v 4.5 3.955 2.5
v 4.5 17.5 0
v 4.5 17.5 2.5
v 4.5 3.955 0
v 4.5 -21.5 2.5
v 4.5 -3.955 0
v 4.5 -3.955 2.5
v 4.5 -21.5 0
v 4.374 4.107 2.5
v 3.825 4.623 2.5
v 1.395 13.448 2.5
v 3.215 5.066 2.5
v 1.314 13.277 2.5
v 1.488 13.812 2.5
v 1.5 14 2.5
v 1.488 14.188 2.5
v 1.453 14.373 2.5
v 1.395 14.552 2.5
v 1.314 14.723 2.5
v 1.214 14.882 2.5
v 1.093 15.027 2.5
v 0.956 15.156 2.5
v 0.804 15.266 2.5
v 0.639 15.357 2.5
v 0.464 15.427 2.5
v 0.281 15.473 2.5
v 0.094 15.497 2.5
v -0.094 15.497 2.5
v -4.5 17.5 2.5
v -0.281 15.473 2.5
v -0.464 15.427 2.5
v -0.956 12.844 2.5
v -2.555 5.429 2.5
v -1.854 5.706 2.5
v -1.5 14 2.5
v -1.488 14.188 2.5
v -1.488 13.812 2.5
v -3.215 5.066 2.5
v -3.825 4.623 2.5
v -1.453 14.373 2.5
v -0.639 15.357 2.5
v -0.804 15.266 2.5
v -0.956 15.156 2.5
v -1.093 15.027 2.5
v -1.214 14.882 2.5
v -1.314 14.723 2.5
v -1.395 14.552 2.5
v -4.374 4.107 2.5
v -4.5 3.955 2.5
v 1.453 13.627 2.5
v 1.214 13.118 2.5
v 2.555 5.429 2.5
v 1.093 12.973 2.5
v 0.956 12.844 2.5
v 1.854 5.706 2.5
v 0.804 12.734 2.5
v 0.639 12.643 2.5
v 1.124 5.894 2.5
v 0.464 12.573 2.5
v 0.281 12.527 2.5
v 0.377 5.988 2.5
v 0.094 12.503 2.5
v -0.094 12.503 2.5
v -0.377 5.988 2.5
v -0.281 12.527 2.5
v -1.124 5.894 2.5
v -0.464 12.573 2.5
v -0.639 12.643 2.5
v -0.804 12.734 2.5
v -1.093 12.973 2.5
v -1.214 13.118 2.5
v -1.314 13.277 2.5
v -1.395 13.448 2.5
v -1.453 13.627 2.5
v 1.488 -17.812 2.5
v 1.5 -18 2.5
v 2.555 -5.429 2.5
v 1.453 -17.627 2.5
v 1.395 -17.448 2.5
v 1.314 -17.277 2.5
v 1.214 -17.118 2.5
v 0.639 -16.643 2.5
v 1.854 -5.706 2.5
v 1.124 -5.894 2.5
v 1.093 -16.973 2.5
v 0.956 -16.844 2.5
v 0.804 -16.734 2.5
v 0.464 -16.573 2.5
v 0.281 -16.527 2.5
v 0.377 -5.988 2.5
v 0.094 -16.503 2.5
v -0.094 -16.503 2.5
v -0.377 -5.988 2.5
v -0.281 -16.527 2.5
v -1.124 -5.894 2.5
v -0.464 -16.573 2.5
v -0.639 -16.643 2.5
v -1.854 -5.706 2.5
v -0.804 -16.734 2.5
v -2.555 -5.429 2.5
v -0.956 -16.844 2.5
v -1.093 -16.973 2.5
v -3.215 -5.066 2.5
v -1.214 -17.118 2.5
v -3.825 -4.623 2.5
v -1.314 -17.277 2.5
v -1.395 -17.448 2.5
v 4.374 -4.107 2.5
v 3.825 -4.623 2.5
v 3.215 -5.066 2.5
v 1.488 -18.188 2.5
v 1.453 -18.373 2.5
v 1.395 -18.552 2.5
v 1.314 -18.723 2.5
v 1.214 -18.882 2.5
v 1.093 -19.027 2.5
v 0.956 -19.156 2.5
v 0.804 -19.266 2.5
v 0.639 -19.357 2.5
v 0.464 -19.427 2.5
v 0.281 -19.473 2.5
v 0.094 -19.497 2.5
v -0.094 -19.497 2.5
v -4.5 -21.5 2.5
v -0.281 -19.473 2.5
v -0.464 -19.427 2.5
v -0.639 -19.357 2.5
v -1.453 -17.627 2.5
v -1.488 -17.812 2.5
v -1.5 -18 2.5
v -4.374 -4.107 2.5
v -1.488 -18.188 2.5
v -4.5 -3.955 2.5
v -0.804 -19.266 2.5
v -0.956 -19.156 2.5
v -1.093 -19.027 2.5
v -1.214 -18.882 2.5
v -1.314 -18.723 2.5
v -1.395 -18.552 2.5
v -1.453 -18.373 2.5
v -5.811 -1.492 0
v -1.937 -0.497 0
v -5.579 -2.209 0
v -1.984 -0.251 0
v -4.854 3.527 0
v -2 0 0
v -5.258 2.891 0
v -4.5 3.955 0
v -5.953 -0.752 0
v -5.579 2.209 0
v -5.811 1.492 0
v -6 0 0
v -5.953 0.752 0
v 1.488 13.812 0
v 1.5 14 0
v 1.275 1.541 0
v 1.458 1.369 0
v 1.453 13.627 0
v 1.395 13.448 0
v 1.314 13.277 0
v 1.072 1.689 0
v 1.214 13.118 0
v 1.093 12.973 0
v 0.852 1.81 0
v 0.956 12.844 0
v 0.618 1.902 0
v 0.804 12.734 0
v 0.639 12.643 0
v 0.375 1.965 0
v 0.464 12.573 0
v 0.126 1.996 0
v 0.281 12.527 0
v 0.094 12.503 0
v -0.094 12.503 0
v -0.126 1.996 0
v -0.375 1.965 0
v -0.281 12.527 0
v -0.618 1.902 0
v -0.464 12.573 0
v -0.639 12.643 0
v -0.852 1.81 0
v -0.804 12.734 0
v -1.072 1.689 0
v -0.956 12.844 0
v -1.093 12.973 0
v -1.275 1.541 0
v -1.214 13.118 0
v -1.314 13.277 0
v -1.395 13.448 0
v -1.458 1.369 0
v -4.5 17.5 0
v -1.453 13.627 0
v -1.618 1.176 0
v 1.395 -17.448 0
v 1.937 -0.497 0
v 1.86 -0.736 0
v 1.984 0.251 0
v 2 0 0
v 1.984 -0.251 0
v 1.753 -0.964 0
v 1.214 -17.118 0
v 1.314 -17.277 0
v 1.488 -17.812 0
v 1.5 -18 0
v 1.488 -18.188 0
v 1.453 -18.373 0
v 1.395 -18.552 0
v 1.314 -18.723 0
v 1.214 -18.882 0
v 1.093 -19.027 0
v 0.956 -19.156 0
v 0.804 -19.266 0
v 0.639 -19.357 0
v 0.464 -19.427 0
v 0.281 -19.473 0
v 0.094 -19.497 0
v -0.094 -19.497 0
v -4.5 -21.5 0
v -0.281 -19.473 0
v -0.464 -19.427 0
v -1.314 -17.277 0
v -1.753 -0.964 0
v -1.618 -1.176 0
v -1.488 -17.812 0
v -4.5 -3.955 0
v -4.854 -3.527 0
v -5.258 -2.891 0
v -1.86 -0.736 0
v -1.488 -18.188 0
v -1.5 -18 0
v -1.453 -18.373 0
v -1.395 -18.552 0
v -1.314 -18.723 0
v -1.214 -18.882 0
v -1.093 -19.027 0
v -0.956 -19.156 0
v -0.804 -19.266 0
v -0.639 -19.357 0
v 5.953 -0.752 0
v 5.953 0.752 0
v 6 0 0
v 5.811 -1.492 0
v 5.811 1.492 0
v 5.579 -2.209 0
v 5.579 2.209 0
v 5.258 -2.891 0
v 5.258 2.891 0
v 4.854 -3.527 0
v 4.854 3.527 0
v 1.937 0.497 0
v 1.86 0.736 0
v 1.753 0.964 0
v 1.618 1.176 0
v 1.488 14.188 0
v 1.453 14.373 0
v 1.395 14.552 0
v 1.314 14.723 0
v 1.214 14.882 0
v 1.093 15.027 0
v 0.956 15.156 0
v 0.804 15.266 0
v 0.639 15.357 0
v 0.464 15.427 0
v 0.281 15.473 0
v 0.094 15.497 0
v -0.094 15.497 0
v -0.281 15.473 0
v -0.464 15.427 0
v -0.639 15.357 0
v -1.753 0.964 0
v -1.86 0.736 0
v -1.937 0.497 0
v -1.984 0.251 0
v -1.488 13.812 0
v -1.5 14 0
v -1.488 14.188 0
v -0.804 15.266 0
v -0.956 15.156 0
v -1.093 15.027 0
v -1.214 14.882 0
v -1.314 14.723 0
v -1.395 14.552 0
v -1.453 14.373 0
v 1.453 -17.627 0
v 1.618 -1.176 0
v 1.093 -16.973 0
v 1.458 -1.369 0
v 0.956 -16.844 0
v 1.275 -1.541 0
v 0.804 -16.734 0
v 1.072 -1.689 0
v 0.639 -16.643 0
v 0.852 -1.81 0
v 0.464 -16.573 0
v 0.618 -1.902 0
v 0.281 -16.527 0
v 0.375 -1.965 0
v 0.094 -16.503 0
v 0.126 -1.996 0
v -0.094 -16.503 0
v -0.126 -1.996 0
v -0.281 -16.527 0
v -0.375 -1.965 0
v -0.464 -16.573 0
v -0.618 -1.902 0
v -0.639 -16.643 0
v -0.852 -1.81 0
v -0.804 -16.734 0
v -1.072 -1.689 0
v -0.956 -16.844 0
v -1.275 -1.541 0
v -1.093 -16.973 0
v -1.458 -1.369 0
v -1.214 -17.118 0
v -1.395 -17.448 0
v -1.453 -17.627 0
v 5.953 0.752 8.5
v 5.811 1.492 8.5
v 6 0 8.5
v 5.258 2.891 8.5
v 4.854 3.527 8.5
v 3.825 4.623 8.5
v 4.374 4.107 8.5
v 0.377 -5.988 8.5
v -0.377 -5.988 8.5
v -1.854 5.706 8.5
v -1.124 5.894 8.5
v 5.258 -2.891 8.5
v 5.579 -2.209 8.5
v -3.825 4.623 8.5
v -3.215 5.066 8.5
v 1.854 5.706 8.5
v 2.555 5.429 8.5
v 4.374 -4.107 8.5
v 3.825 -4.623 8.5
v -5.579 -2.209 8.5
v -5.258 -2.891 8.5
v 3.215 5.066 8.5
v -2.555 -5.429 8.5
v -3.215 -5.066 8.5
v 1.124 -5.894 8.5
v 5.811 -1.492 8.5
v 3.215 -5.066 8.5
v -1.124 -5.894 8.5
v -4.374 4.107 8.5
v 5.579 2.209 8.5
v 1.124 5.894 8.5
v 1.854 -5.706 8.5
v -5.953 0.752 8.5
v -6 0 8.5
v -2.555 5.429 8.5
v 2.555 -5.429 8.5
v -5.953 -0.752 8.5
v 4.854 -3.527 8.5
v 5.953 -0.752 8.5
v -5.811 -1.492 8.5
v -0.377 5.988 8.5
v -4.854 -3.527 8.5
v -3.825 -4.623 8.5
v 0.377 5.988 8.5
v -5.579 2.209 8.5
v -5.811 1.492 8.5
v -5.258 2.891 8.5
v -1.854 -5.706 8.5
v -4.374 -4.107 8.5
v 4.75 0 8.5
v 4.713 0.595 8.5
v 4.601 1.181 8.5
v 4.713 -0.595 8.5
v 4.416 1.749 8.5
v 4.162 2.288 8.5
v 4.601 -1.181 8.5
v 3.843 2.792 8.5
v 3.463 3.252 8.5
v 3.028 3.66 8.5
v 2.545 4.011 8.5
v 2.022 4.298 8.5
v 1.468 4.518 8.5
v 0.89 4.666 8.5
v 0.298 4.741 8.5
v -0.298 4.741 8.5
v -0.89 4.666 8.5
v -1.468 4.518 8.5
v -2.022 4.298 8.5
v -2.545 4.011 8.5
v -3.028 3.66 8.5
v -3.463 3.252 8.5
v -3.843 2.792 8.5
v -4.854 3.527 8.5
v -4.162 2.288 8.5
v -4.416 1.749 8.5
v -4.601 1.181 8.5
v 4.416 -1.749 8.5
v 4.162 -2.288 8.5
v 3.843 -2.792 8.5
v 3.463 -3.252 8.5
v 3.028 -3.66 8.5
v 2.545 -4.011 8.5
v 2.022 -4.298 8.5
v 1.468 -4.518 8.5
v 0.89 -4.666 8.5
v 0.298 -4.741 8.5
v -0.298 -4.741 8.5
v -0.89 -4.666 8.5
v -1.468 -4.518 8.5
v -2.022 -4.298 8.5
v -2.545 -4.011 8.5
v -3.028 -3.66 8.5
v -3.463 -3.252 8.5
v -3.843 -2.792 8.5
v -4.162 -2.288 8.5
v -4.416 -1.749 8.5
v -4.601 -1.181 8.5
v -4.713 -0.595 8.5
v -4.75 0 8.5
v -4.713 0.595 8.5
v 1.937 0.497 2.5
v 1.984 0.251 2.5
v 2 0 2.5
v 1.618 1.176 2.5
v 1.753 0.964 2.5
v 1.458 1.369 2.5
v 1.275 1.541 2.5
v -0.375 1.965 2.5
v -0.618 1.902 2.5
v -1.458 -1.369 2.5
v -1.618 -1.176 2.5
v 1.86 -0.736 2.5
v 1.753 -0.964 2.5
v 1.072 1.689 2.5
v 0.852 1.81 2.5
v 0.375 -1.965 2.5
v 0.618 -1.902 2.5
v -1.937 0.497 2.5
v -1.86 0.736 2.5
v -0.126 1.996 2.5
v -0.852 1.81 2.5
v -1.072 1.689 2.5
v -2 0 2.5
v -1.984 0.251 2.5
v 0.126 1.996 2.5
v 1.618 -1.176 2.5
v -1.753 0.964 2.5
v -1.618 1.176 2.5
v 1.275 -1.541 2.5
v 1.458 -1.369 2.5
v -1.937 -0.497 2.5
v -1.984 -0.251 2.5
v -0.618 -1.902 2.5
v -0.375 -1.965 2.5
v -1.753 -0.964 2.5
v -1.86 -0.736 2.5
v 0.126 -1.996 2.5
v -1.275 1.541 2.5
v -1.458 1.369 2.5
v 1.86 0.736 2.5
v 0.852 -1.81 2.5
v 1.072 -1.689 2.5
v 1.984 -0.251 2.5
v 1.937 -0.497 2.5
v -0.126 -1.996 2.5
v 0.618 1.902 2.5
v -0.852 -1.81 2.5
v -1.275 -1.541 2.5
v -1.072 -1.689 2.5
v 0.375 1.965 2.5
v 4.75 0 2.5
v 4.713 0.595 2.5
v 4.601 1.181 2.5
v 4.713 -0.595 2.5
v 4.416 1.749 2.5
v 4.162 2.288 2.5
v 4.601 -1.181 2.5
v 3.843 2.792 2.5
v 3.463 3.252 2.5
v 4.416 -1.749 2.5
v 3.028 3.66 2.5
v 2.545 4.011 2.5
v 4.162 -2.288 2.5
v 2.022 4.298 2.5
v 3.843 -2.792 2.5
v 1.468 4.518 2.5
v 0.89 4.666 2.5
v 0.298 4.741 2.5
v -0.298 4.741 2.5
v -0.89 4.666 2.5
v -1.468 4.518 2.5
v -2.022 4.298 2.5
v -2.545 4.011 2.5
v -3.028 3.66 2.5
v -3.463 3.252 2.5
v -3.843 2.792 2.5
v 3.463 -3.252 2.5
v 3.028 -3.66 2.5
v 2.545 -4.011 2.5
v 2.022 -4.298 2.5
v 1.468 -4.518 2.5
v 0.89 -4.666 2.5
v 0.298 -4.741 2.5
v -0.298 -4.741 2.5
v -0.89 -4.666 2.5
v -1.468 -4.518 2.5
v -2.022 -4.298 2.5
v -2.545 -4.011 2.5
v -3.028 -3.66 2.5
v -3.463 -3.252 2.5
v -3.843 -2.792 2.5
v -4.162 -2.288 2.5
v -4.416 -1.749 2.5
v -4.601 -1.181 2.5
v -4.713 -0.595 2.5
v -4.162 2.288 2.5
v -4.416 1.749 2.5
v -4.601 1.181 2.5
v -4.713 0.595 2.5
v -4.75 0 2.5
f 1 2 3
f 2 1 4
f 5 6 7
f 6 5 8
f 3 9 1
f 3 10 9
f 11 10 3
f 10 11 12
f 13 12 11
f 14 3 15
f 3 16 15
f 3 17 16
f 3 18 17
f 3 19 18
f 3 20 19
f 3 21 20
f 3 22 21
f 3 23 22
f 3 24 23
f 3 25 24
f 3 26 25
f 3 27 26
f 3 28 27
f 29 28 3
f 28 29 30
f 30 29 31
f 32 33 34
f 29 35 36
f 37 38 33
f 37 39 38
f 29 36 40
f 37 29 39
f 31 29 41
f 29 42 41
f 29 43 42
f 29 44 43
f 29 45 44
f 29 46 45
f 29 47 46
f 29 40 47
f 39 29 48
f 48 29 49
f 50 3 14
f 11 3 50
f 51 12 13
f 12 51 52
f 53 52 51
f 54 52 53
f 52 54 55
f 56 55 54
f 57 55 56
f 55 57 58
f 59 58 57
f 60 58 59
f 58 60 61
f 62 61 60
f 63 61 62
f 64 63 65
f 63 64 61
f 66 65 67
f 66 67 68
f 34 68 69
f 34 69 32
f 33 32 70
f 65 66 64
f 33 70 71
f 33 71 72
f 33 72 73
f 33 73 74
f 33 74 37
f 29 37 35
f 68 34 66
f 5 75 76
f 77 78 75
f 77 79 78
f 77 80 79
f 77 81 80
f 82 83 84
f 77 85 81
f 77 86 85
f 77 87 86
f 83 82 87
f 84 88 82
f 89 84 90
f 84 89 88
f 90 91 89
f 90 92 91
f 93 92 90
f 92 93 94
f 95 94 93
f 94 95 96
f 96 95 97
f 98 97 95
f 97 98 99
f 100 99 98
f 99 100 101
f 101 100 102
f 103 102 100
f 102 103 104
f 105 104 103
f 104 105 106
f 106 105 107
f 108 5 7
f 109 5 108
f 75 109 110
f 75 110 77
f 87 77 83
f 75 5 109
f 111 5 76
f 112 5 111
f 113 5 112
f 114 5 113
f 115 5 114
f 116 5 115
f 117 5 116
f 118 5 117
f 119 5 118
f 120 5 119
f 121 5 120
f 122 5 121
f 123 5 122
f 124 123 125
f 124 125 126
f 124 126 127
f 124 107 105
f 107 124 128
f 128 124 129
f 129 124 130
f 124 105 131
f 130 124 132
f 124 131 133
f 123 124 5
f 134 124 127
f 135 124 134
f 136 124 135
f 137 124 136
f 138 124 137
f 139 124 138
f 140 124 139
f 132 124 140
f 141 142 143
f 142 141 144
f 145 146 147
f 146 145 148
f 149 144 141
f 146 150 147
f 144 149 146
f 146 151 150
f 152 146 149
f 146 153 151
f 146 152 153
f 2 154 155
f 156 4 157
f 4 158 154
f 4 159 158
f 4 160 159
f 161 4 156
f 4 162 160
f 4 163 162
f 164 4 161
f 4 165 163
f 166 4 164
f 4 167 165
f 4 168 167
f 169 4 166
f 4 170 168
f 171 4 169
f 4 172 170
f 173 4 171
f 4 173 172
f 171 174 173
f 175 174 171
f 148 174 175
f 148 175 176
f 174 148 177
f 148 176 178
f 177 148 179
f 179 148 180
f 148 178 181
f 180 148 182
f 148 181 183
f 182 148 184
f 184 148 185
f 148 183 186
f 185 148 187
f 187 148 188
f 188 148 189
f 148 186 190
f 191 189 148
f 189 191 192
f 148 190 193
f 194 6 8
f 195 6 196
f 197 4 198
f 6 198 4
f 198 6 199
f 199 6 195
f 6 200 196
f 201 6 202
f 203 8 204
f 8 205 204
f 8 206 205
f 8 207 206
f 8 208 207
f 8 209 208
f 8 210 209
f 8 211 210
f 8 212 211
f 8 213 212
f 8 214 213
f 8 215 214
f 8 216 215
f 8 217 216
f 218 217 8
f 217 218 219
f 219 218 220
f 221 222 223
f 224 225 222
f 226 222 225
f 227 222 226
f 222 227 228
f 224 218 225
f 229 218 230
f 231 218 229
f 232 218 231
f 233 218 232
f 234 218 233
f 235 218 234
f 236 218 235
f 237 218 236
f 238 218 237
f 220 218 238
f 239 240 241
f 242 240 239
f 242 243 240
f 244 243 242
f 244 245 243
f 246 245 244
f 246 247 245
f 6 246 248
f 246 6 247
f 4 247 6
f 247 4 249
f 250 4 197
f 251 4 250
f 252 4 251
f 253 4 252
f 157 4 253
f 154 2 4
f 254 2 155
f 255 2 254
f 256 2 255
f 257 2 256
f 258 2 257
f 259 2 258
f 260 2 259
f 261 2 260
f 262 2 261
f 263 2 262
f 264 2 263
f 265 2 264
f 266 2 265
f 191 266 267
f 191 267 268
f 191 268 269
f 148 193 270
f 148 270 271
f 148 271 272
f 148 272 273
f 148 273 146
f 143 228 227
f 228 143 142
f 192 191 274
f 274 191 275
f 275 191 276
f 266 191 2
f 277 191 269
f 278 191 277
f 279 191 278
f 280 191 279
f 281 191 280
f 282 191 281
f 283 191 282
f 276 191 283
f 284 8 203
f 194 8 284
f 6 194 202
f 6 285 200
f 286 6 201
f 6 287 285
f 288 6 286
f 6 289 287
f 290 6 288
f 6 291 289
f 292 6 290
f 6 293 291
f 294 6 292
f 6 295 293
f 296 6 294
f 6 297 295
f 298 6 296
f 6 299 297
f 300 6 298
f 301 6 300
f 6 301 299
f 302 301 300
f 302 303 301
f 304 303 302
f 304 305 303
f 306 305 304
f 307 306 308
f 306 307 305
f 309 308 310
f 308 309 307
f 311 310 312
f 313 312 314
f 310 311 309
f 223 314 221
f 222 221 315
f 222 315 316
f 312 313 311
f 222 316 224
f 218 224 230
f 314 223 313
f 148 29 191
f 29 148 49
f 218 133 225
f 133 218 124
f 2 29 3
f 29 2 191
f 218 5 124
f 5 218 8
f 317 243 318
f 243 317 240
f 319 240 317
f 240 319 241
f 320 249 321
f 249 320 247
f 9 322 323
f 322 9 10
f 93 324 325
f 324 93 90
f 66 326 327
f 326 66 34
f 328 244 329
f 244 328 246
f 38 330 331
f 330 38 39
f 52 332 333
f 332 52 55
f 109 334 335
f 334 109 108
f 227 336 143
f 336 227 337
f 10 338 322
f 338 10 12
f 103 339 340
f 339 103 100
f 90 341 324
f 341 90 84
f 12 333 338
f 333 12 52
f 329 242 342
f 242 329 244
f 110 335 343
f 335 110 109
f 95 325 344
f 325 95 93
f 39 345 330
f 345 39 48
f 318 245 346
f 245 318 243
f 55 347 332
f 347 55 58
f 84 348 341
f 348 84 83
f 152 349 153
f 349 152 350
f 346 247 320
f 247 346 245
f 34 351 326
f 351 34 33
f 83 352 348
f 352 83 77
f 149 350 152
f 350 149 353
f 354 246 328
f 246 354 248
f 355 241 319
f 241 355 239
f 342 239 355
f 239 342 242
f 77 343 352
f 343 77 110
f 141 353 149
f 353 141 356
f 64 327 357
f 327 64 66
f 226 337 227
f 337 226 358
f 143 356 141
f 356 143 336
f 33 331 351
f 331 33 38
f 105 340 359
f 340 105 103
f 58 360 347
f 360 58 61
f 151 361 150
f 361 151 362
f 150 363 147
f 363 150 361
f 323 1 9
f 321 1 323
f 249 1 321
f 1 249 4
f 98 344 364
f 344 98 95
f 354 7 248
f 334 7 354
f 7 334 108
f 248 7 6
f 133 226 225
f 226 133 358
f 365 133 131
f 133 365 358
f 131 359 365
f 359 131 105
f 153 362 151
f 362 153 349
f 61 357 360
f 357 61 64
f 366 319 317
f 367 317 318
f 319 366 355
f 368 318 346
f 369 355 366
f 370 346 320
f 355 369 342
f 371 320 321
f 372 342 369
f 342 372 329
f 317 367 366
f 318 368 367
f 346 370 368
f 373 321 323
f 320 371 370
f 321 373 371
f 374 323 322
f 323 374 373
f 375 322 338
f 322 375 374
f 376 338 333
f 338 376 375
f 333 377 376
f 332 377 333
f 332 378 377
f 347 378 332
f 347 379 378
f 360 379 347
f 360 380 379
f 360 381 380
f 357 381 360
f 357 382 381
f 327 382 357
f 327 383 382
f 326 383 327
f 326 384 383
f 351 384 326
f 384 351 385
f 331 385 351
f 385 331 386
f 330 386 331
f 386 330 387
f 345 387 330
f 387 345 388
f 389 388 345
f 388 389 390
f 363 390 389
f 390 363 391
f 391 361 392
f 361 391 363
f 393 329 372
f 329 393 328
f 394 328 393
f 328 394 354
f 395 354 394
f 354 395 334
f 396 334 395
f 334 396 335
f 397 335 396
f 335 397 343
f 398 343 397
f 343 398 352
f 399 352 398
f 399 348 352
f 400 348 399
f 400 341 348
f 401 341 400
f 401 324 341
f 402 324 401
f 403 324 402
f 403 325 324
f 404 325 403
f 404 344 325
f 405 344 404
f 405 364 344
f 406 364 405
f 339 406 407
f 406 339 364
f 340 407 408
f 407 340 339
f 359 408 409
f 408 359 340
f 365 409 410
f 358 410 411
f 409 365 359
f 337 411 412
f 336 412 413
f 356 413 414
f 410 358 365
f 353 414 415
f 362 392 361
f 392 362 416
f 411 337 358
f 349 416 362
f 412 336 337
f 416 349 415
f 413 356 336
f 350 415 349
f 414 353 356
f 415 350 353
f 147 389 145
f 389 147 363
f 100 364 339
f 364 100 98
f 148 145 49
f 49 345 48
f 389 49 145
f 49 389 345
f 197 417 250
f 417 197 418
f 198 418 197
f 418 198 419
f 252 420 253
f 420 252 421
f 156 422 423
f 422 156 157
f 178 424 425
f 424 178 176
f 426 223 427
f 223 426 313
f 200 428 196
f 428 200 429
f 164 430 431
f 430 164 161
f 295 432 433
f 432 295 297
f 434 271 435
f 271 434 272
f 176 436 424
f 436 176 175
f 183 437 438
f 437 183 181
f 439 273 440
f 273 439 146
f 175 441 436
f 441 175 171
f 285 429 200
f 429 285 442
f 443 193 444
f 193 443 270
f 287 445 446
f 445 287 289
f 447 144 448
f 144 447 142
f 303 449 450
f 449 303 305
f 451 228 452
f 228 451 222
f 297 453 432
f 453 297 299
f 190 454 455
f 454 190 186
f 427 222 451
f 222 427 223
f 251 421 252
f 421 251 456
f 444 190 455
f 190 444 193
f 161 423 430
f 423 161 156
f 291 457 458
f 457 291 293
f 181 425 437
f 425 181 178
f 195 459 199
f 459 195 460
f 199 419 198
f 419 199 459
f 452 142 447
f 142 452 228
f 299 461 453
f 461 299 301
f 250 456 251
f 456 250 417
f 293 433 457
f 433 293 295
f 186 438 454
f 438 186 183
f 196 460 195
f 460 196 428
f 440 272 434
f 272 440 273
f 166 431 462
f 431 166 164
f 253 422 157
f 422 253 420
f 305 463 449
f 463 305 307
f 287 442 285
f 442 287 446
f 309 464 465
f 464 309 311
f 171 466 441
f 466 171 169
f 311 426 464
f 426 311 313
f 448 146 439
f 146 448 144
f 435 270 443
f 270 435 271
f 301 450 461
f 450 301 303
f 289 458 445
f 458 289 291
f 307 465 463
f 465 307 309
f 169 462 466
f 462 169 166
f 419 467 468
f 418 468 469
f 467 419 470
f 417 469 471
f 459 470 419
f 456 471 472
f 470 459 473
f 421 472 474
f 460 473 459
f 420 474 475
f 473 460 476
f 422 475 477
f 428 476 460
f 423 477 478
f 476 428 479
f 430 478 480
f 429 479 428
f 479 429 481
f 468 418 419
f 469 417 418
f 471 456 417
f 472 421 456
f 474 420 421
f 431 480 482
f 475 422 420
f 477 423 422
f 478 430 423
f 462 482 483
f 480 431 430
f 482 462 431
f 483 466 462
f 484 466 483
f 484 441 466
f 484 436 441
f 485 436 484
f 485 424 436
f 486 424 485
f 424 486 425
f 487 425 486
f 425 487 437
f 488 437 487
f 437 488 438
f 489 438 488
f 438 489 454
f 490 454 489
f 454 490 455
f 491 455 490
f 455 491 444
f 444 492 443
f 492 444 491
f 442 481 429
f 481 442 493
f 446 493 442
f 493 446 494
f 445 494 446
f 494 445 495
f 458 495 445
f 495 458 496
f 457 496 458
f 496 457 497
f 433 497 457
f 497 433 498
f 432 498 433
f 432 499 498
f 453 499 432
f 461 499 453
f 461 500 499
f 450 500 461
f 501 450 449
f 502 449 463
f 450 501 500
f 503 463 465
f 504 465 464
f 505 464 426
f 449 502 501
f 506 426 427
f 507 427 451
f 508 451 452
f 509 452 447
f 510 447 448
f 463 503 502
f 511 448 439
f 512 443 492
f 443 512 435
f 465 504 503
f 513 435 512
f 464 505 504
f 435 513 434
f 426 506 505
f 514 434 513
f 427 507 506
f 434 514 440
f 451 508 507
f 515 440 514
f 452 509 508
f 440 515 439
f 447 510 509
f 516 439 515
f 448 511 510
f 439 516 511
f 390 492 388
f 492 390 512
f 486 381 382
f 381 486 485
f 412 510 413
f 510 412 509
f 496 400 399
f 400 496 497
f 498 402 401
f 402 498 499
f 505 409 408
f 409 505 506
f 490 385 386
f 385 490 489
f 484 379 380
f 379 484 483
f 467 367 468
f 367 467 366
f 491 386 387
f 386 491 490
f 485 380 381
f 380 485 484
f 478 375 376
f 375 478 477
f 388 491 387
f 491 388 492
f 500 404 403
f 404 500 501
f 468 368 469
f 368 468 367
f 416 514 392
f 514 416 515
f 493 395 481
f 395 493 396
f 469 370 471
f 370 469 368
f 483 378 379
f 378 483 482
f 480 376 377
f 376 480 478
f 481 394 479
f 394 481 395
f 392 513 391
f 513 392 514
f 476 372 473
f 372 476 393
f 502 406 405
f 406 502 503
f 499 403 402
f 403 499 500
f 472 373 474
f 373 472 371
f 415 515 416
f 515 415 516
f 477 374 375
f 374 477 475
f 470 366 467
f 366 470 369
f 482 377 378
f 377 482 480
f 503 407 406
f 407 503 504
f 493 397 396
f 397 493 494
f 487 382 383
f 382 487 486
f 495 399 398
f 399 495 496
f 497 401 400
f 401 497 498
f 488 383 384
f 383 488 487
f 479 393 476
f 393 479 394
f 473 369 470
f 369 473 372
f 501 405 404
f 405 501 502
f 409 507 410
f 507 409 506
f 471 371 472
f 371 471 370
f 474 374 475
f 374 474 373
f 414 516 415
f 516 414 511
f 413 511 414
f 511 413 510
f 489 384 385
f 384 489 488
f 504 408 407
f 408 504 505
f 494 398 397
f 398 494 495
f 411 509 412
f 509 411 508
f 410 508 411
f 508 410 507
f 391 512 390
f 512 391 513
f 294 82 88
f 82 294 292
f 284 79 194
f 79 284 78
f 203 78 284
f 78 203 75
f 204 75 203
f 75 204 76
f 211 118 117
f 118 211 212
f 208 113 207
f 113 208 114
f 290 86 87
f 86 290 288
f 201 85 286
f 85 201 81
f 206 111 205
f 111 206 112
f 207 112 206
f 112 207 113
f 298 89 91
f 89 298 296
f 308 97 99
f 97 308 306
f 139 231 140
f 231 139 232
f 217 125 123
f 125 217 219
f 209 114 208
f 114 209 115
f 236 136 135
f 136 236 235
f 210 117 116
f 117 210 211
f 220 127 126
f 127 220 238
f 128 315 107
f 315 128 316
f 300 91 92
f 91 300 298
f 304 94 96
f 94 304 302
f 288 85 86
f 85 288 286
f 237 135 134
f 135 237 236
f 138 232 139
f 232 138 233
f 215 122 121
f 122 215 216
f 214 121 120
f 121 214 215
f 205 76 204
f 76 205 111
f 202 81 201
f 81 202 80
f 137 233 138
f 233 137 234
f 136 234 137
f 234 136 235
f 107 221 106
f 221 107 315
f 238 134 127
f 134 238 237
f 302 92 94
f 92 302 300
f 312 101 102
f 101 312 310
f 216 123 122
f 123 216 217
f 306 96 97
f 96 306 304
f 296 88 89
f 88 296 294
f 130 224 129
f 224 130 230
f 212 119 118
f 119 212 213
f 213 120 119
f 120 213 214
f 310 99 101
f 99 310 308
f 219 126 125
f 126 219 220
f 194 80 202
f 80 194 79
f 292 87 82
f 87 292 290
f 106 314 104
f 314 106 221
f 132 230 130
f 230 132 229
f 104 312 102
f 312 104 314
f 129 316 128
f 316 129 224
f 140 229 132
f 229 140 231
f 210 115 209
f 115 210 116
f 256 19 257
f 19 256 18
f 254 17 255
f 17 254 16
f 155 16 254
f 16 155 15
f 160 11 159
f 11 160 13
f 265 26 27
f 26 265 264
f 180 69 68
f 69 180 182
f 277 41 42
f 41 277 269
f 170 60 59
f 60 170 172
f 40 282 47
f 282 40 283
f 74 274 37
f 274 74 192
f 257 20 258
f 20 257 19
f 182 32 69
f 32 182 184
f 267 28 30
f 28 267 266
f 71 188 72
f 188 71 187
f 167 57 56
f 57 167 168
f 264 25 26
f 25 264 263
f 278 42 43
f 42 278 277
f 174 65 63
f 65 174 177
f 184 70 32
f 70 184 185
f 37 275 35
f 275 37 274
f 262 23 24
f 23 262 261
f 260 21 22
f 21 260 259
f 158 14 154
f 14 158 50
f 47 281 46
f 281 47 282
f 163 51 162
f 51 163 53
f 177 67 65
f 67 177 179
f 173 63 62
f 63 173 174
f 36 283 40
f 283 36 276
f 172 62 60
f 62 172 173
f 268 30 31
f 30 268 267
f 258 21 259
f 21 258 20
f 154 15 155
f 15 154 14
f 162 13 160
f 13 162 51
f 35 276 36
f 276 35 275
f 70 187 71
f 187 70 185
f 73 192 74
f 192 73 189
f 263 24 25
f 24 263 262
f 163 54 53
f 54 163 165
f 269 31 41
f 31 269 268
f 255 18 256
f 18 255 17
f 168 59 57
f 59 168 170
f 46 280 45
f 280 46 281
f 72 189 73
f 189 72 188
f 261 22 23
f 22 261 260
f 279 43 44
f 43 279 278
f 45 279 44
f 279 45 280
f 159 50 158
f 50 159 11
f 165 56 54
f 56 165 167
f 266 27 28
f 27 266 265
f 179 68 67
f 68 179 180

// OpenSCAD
MOUNT_HOLE_DIA = 3;
MOUNT_HOLE_SPACING = 32;

WIDTH = 9;
LENGTH = 39;
THICKNESS = 2.5;

TUBE_DIA = 4;
TUBE_OFFSET = 2;

ADAPTER_OUTER_DIA = 12;
ADAPTER_INNER_DIA = 9.5;
ADAPTER_LENGTH = 6;

$fn = 50;

difference() {
  union() {
    translate([0, -TUBE_OFFSET, THICKNESS/2])
    cube([WIDTH, LENGTH, THICKNESS], center = true);
    cylinder(d = ADAPTER_OUTER_DIA, h = THICKNESS + ADAPTER_LENGTH);
  }

  #cylinder(d = TUBE_DIA, h = THICKNESS + ADAPTER_LENGTH);

  #translate([0, 0, THICKNESS])
  cylinder(d = ADAPTER_INNER_DIA, h = ADAPTER_LENGTH);

  #translate([0, -MOUNT_HOLE_SPACING/2 - TUBE_OFFSET, 0])
  cylinder(d = MOUNT_HOLE_DIA, h = THICKNESS);

  #translate([0, MOUNT_HOLE_SPACING/2 - TUBE_OFFSET, 0])
  cylinder(d = MOUNT_HOLE_DIA, h = THICKNESS);
}
